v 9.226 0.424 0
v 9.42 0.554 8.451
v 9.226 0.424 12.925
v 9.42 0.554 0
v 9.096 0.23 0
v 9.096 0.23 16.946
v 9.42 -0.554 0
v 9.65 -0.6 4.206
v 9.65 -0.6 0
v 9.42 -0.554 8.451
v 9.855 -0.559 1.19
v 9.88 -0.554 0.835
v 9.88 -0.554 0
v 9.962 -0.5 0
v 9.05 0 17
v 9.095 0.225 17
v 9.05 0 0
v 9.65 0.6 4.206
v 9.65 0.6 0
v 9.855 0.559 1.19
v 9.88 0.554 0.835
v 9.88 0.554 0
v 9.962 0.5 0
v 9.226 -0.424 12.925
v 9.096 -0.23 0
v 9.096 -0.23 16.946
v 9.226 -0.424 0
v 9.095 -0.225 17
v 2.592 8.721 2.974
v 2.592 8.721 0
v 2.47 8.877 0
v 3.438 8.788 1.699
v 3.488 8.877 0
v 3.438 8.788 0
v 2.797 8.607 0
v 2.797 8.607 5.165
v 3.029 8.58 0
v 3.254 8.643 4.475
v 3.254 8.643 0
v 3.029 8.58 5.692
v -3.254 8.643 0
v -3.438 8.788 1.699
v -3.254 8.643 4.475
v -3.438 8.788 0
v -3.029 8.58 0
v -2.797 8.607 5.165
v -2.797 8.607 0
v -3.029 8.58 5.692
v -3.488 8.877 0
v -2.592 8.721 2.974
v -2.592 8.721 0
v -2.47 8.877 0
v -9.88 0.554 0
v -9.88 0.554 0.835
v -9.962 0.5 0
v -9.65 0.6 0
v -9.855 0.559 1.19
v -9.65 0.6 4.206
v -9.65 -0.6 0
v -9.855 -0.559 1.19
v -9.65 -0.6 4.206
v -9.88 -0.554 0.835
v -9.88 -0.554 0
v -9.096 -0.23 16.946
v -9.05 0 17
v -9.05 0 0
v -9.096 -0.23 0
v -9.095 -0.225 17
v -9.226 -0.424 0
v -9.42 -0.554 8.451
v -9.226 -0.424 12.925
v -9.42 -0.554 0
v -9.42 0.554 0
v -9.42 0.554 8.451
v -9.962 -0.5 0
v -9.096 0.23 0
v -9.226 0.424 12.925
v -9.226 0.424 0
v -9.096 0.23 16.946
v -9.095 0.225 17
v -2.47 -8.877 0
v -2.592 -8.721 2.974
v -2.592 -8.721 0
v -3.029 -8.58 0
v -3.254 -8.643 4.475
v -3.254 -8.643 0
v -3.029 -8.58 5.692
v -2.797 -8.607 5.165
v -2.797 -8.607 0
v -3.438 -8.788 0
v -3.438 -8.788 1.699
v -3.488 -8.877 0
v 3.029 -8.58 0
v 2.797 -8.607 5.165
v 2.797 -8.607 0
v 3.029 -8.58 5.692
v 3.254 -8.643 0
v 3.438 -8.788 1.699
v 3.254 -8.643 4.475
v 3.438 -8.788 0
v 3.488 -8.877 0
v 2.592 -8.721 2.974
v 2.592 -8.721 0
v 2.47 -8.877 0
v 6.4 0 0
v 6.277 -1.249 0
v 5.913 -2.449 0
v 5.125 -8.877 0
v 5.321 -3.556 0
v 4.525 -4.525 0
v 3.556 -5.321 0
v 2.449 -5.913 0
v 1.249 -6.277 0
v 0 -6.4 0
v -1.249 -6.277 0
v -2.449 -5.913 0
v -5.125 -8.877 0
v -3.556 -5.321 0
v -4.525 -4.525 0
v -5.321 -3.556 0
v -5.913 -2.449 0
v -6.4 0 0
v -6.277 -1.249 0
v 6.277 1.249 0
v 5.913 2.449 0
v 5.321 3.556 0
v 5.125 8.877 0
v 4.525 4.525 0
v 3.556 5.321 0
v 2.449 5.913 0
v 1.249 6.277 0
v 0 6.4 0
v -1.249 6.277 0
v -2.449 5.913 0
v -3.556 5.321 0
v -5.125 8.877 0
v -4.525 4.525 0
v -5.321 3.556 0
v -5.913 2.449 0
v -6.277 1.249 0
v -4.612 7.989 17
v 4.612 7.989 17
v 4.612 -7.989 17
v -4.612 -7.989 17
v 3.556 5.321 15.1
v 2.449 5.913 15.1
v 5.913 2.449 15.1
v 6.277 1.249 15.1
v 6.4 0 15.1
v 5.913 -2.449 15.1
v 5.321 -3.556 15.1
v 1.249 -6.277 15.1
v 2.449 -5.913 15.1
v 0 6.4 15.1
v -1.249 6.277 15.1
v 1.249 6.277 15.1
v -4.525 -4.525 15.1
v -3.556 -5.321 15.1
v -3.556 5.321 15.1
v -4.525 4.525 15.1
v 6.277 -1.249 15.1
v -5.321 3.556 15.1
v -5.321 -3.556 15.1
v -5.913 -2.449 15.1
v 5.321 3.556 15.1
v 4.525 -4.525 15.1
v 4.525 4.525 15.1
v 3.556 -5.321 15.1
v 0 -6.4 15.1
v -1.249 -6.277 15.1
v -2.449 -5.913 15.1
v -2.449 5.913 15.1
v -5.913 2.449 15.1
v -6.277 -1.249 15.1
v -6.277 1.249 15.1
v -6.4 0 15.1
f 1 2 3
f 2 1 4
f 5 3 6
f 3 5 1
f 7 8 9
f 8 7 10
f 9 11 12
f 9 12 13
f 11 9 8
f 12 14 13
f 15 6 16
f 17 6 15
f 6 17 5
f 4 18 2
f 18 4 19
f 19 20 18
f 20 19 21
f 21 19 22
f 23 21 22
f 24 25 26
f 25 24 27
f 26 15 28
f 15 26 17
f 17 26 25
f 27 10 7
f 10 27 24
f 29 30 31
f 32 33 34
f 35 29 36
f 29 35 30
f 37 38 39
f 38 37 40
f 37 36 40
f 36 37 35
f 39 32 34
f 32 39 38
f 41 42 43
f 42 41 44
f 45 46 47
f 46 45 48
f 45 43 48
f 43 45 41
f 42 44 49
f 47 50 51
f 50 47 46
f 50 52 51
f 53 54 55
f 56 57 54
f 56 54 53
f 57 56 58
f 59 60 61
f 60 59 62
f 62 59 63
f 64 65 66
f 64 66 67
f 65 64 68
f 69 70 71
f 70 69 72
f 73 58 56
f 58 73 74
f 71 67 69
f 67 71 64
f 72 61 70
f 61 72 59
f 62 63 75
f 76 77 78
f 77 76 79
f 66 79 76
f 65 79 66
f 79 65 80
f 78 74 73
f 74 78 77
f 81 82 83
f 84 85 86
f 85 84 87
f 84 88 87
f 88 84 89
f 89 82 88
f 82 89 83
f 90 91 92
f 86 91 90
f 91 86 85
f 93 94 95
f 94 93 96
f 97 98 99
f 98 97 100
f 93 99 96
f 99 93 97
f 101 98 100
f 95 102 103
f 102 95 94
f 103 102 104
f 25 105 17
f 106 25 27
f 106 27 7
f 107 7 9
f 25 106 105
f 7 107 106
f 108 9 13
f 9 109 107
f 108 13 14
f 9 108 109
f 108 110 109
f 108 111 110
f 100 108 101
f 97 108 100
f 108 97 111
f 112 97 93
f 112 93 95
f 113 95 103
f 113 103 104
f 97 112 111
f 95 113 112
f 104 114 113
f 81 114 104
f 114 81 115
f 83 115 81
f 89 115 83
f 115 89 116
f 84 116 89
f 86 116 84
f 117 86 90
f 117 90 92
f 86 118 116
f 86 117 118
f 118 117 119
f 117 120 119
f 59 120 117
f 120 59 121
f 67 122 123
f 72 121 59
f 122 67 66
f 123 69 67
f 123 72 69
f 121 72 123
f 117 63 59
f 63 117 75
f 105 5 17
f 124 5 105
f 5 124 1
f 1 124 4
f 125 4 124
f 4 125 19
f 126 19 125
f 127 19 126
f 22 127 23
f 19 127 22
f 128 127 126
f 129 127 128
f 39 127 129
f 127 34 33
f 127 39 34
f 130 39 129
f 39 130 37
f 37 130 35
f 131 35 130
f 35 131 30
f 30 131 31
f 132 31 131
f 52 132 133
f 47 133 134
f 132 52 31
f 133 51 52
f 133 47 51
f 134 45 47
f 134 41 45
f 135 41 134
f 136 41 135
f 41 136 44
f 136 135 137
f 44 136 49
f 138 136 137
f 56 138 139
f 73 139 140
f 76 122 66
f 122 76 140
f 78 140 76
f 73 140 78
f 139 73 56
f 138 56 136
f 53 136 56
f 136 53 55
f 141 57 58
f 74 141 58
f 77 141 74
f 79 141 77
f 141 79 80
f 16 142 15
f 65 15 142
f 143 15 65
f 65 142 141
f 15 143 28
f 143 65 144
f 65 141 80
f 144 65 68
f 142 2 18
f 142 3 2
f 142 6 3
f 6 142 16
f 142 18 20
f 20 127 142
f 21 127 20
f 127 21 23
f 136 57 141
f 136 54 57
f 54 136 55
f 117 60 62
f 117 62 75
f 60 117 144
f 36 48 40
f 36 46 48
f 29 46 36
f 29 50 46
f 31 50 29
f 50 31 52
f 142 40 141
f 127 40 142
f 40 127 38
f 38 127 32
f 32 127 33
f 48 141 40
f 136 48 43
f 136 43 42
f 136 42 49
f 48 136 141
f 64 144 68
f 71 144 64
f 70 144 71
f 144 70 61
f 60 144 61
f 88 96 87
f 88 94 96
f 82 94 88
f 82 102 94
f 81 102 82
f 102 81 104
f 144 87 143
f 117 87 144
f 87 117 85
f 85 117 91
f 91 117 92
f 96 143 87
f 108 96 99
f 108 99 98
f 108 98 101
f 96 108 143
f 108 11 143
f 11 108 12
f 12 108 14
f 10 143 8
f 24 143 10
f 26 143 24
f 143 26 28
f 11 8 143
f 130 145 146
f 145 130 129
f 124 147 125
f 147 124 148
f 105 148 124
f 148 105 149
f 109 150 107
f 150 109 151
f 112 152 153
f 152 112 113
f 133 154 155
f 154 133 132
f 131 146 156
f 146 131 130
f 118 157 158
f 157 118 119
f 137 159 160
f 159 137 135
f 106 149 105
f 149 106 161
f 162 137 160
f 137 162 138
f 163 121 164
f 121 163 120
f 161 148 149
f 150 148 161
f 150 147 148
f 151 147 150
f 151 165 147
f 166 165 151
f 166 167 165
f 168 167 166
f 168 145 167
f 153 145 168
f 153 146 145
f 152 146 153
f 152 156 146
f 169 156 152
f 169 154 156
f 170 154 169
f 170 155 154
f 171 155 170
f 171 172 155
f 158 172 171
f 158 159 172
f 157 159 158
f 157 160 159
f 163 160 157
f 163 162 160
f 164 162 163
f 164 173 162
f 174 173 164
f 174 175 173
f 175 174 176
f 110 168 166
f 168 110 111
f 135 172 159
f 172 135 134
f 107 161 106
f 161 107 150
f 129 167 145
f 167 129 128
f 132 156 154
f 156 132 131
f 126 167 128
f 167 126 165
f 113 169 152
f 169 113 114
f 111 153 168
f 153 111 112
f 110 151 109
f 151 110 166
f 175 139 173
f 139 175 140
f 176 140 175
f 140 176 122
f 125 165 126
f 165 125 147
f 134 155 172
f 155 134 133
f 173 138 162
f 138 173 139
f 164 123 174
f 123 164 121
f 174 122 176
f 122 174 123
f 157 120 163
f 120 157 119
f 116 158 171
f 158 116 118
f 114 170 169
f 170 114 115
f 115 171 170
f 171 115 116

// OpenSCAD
// ACCESS KNOB — Standard Eurorack Module Knob (Slip-On Sleeve)
// Generated via CLI for Studio Knobs (Slip-On Sleeve)
module access_knob_eurorack_std_slipon() {
  outer_d = 20.5;
  height = 17;
  taper = 0.9;
  bore_d = 12.5;
  slot_h = 15;
  tex_depth = 1.2;
  tex_scale = 1.2;
  tex_count = 10;

  difference() {
    cylinder(h=height, d1=outer_d, d2=outer_d*taper, $fn=6);
    translate([0,0,-0.1]) cylinder(h=slot_h+0.2, d=bore_d + 0.3, $fn=32);
    for(i=[0:tex_count-1]) {
      rotate([0,0,i*(360/tex_count)])
        translate([outer_d/2-tex_depth/2, 0, height/2])
          cylinder(h=height*1.1, d=tex_scale, center=true, $fn=16);
    }
  }
}
access_knob_eurorack_std_slipon();
